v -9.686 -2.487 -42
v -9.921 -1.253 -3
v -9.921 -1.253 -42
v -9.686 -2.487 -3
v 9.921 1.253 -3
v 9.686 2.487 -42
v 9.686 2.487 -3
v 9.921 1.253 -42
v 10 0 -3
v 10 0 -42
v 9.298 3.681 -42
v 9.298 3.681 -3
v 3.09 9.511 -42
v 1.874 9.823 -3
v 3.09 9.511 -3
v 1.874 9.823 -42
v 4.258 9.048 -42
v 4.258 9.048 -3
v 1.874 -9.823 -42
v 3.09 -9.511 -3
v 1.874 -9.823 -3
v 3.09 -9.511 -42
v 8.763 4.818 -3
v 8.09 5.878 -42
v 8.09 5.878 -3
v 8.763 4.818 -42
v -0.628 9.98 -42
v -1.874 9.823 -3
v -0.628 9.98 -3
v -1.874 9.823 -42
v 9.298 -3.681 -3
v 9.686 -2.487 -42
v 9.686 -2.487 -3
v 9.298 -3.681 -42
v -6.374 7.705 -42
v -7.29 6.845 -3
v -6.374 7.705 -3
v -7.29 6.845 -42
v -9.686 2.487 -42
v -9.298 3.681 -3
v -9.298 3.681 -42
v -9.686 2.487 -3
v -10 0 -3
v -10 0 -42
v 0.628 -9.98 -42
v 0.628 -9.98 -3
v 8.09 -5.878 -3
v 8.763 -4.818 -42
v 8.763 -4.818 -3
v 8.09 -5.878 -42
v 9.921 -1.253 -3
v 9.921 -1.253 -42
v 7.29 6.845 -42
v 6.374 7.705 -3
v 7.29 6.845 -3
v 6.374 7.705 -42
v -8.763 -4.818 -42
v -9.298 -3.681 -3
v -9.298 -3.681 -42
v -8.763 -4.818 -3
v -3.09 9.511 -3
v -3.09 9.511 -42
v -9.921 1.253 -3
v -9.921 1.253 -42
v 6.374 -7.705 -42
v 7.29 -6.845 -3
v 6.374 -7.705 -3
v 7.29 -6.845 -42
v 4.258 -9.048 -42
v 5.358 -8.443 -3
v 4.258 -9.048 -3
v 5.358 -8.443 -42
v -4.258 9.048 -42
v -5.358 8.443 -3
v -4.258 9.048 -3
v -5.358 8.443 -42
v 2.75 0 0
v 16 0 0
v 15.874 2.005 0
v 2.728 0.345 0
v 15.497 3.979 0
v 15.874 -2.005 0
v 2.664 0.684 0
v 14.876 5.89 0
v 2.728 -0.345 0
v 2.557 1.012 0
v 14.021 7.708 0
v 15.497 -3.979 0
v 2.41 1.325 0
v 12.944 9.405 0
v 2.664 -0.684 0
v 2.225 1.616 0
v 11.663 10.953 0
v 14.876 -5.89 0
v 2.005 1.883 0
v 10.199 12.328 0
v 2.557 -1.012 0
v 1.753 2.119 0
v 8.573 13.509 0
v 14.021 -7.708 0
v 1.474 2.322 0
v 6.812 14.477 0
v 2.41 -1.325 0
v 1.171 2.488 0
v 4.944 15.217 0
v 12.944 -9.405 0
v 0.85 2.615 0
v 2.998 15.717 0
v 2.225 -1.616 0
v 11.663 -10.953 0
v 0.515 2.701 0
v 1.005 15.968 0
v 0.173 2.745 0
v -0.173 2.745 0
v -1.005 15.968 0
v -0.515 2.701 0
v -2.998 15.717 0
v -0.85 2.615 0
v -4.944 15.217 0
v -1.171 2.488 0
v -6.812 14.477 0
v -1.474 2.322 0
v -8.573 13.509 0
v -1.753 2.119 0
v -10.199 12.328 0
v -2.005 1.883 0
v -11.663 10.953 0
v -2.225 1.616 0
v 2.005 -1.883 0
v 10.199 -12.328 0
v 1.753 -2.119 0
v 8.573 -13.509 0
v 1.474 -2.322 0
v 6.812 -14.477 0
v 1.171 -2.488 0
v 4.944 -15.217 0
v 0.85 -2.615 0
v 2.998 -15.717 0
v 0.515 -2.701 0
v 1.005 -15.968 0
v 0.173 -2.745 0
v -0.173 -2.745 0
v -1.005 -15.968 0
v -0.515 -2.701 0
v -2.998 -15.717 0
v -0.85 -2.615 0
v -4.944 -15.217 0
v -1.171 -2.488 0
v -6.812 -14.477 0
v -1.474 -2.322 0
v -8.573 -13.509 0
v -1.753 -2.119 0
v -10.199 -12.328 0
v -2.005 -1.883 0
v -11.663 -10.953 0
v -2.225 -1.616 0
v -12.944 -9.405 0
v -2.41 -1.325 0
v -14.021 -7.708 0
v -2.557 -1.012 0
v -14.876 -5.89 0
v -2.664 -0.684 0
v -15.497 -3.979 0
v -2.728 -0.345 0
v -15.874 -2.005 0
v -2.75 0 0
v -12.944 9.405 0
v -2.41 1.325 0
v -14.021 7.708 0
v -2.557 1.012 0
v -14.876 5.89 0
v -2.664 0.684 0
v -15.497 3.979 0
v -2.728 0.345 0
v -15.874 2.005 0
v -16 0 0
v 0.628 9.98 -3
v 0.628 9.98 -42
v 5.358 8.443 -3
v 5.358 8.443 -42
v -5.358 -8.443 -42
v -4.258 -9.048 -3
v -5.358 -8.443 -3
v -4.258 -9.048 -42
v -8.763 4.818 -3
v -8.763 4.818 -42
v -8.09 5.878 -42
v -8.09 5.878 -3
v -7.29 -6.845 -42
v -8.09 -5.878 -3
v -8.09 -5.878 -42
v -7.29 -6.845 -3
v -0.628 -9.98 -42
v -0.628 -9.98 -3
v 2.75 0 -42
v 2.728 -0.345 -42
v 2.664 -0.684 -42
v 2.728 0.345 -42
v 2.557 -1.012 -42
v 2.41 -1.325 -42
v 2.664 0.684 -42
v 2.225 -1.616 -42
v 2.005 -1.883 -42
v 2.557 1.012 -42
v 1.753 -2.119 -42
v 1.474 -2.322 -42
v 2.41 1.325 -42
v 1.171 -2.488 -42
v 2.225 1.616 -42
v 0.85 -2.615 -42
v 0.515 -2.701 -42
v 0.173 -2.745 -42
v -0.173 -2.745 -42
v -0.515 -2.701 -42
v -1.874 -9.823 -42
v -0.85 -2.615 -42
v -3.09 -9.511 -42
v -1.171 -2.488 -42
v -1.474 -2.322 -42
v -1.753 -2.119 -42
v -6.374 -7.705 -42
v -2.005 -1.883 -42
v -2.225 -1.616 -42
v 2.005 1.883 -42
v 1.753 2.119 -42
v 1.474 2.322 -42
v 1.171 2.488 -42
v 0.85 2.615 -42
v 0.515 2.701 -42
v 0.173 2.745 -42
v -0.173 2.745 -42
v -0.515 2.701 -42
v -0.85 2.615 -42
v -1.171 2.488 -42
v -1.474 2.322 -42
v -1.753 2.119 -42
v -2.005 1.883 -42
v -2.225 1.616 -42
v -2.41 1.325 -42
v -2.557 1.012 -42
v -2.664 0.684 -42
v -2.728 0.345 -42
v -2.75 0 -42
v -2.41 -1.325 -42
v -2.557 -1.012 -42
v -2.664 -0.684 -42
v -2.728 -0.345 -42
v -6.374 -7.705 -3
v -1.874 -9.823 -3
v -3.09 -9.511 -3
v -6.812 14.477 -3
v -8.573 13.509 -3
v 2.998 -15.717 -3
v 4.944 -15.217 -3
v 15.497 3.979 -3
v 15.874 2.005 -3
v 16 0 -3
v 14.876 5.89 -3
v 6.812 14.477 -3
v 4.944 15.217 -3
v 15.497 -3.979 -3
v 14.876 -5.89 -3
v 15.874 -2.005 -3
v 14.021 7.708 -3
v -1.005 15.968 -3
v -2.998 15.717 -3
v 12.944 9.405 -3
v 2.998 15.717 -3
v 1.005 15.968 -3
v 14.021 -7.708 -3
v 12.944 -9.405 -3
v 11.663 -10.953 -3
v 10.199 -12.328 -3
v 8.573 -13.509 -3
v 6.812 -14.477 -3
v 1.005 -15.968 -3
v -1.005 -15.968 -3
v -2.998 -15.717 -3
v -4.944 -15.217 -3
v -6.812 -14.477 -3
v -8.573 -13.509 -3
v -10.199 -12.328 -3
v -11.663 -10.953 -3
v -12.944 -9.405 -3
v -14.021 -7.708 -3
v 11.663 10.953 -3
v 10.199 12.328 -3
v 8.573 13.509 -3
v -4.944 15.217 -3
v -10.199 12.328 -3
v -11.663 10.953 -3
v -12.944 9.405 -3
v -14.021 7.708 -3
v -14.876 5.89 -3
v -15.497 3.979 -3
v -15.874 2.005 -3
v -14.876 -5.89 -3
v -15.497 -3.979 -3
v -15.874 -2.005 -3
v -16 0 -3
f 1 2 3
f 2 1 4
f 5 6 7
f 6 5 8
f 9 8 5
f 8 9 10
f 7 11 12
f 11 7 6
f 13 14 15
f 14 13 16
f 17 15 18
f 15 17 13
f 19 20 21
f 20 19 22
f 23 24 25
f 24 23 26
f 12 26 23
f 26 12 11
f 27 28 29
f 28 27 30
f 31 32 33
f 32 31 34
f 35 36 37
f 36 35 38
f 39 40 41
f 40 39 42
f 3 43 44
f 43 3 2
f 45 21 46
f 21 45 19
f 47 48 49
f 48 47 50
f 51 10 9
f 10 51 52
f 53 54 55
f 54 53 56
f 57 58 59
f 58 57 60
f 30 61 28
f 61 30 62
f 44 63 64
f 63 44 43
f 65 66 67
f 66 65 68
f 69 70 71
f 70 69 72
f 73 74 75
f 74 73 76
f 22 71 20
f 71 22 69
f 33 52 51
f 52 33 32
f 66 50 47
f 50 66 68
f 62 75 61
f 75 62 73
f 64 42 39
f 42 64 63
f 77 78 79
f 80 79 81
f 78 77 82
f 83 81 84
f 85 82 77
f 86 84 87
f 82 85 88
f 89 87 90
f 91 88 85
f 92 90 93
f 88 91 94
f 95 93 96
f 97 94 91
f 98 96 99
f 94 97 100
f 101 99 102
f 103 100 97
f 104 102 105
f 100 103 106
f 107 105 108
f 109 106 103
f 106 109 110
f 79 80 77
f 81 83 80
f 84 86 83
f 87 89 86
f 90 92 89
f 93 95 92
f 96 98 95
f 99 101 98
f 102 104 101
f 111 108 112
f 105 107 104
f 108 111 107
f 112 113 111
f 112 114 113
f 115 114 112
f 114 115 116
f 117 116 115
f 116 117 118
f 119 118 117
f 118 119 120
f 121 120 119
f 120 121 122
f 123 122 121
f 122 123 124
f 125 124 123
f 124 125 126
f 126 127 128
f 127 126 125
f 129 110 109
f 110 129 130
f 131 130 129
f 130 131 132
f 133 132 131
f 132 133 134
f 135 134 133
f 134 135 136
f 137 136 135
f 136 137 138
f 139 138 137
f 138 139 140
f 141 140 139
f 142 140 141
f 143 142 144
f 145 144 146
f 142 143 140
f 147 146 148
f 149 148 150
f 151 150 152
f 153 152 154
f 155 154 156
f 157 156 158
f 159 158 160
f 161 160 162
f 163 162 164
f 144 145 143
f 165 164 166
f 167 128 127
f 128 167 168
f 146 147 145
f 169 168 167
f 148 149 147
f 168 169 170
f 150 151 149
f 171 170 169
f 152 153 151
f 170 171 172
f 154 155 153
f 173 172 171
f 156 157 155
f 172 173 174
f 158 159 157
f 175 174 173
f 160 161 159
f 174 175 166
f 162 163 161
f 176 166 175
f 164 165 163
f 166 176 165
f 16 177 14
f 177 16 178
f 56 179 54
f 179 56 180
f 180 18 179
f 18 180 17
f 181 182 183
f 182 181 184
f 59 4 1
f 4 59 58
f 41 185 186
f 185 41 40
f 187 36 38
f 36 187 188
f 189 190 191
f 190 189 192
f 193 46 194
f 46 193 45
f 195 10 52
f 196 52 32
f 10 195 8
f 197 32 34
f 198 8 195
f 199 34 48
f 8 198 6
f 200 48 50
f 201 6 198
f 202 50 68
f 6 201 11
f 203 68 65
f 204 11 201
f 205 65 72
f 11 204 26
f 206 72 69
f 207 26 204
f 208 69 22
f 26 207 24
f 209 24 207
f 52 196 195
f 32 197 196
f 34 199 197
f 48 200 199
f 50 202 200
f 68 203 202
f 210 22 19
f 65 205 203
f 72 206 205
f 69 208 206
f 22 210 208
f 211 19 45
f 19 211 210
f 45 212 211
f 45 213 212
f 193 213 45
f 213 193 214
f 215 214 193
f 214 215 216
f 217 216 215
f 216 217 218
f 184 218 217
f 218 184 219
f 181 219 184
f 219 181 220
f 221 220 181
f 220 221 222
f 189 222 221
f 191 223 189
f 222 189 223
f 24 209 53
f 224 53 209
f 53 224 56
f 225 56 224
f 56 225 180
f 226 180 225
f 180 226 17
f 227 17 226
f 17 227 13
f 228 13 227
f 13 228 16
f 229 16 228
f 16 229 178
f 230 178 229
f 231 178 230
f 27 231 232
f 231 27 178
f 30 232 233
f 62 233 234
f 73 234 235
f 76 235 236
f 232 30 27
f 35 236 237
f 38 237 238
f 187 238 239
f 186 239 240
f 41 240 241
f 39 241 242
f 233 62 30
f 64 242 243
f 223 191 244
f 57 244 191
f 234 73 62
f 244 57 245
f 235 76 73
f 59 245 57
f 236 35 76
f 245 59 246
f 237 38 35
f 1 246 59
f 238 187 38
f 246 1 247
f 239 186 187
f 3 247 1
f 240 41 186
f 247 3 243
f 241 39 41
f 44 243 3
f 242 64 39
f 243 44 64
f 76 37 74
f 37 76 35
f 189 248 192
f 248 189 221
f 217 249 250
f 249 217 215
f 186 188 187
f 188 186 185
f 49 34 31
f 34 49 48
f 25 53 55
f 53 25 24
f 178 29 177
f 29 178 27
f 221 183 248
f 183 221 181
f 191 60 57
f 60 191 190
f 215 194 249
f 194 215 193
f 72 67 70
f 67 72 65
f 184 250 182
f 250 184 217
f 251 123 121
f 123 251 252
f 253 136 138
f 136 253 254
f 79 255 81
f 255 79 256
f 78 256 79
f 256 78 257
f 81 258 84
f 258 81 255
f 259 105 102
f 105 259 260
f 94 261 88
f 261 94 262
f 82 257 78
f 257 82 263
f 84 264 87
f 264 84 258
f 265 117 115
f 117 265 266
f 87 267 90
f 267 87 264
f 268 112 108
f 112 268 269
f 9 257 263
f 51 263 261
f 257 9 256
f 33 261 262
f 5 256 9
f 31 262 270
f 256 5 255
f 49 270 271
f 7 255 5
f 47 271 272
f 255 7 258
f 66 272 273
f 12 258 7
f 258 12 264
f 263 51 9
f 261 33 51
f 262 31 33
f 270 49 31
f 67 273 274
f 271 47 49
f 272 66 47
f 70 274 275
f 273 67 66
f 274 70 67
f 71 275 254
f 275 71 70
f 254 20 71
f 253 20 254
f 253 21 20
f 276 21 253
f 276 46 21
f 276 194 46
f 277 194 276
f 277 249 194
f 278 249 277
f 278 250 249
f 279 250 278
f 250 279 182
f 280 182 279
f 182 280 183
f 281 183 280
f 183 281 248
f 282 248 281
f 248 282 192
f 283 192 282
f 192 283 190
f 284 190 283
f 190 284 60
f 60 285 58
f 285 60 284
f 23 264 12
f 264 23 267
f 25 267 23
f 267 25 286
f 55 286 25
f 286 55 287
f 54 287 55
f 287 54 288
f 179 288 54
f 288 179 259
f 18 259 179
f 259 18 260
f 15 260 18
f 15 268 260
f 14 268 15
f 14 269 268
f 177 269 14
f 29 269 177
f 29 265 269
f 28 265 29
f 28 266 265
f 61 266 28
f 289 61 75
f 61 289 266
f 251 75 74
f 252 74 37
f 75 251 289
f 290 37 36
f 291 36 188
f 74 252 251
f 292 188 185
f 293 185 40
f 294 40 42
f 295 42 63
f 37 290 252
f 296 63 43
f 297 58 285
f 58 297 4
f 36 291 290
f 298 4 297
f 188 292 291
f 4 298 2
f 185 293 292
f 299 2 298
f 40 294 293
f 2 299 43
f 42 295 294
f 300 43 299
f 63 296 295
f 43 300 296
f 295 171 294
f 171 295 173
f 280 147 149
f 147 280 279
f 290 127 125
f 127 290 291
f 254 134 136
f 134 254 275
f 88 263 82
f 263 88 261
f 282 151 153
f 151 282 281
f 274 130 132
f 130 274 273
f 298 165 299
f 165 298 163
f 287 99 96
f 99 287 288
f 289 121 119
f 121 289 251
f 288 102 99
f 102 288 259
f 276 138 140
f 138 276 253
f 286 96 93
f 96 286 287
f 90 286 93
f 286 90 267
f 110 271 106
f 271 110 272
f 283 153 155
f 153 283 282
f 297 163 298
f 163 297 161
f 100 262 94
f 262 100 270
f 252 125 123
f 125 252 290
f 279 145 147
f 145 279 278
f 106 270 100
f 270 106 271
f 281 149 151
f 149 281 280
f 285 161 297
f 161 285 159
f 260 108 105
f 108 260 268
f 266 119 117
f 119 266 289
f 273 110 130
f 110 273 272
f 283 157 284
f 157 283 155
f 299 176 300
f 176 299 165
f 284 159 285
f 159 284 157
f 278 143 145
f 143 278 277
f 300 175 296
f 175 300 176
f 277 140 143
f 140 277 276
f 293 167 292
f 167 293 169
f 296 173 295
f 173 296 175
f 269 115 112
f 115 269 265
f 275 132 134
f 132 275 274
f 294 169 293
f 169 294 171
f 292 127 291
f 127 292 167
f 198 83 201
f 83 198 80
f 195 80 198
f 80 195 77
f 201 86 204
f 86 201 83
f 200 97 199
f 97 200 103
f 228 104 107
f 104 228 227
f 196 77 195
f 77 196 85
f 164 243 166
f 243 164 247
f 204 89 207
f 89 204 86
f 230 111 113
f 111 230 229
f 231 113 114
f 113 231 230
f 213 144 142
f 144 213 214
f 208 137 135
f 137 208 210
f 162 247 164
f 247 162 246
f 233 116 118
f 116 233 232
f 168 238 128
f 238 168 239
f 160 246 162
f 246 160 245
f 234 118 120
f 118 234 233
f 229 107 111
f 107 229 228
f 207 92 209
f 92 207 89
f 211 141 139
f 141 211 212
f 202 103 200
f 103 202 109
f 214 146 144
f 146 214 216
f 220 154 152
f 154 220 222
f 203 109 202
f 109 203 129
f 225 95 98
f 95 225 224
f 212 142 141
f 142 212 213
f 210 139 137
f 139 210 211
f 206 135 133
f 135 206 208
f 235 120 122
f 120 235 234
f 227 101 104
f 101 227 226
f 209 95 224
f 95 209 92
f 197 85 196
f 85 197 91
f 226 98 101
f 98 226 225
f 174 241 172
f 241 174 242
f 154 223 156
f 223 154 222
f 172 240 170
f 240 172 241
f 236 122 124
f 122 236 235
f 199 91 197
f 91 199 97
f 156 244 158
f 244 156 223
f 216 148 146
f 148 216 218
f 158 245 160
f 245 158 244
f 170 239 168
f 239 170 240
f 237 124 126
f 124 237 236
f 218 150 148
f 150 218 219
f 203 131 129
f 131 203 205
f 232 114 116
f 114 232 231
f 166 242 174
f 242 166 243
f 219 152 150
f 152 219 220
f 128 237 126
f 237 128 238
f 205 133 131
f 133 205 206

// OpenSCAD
$fn = 50;


difference() {
	union() {
		translate(v = [0, 0, -42.0000000000]) {
			cylinder(h = 42, r = 10.0000000000);
		}
		translate(v = [0, 0, -3.0000000000]) {
			cylinder(h = 3, r = 16.0000000000);
		}
	}
	union() {
		#translate(v = [0, 0, -42]) {
			cylinder(h = 42, r = 2.7500000000);
		}
	}
}
